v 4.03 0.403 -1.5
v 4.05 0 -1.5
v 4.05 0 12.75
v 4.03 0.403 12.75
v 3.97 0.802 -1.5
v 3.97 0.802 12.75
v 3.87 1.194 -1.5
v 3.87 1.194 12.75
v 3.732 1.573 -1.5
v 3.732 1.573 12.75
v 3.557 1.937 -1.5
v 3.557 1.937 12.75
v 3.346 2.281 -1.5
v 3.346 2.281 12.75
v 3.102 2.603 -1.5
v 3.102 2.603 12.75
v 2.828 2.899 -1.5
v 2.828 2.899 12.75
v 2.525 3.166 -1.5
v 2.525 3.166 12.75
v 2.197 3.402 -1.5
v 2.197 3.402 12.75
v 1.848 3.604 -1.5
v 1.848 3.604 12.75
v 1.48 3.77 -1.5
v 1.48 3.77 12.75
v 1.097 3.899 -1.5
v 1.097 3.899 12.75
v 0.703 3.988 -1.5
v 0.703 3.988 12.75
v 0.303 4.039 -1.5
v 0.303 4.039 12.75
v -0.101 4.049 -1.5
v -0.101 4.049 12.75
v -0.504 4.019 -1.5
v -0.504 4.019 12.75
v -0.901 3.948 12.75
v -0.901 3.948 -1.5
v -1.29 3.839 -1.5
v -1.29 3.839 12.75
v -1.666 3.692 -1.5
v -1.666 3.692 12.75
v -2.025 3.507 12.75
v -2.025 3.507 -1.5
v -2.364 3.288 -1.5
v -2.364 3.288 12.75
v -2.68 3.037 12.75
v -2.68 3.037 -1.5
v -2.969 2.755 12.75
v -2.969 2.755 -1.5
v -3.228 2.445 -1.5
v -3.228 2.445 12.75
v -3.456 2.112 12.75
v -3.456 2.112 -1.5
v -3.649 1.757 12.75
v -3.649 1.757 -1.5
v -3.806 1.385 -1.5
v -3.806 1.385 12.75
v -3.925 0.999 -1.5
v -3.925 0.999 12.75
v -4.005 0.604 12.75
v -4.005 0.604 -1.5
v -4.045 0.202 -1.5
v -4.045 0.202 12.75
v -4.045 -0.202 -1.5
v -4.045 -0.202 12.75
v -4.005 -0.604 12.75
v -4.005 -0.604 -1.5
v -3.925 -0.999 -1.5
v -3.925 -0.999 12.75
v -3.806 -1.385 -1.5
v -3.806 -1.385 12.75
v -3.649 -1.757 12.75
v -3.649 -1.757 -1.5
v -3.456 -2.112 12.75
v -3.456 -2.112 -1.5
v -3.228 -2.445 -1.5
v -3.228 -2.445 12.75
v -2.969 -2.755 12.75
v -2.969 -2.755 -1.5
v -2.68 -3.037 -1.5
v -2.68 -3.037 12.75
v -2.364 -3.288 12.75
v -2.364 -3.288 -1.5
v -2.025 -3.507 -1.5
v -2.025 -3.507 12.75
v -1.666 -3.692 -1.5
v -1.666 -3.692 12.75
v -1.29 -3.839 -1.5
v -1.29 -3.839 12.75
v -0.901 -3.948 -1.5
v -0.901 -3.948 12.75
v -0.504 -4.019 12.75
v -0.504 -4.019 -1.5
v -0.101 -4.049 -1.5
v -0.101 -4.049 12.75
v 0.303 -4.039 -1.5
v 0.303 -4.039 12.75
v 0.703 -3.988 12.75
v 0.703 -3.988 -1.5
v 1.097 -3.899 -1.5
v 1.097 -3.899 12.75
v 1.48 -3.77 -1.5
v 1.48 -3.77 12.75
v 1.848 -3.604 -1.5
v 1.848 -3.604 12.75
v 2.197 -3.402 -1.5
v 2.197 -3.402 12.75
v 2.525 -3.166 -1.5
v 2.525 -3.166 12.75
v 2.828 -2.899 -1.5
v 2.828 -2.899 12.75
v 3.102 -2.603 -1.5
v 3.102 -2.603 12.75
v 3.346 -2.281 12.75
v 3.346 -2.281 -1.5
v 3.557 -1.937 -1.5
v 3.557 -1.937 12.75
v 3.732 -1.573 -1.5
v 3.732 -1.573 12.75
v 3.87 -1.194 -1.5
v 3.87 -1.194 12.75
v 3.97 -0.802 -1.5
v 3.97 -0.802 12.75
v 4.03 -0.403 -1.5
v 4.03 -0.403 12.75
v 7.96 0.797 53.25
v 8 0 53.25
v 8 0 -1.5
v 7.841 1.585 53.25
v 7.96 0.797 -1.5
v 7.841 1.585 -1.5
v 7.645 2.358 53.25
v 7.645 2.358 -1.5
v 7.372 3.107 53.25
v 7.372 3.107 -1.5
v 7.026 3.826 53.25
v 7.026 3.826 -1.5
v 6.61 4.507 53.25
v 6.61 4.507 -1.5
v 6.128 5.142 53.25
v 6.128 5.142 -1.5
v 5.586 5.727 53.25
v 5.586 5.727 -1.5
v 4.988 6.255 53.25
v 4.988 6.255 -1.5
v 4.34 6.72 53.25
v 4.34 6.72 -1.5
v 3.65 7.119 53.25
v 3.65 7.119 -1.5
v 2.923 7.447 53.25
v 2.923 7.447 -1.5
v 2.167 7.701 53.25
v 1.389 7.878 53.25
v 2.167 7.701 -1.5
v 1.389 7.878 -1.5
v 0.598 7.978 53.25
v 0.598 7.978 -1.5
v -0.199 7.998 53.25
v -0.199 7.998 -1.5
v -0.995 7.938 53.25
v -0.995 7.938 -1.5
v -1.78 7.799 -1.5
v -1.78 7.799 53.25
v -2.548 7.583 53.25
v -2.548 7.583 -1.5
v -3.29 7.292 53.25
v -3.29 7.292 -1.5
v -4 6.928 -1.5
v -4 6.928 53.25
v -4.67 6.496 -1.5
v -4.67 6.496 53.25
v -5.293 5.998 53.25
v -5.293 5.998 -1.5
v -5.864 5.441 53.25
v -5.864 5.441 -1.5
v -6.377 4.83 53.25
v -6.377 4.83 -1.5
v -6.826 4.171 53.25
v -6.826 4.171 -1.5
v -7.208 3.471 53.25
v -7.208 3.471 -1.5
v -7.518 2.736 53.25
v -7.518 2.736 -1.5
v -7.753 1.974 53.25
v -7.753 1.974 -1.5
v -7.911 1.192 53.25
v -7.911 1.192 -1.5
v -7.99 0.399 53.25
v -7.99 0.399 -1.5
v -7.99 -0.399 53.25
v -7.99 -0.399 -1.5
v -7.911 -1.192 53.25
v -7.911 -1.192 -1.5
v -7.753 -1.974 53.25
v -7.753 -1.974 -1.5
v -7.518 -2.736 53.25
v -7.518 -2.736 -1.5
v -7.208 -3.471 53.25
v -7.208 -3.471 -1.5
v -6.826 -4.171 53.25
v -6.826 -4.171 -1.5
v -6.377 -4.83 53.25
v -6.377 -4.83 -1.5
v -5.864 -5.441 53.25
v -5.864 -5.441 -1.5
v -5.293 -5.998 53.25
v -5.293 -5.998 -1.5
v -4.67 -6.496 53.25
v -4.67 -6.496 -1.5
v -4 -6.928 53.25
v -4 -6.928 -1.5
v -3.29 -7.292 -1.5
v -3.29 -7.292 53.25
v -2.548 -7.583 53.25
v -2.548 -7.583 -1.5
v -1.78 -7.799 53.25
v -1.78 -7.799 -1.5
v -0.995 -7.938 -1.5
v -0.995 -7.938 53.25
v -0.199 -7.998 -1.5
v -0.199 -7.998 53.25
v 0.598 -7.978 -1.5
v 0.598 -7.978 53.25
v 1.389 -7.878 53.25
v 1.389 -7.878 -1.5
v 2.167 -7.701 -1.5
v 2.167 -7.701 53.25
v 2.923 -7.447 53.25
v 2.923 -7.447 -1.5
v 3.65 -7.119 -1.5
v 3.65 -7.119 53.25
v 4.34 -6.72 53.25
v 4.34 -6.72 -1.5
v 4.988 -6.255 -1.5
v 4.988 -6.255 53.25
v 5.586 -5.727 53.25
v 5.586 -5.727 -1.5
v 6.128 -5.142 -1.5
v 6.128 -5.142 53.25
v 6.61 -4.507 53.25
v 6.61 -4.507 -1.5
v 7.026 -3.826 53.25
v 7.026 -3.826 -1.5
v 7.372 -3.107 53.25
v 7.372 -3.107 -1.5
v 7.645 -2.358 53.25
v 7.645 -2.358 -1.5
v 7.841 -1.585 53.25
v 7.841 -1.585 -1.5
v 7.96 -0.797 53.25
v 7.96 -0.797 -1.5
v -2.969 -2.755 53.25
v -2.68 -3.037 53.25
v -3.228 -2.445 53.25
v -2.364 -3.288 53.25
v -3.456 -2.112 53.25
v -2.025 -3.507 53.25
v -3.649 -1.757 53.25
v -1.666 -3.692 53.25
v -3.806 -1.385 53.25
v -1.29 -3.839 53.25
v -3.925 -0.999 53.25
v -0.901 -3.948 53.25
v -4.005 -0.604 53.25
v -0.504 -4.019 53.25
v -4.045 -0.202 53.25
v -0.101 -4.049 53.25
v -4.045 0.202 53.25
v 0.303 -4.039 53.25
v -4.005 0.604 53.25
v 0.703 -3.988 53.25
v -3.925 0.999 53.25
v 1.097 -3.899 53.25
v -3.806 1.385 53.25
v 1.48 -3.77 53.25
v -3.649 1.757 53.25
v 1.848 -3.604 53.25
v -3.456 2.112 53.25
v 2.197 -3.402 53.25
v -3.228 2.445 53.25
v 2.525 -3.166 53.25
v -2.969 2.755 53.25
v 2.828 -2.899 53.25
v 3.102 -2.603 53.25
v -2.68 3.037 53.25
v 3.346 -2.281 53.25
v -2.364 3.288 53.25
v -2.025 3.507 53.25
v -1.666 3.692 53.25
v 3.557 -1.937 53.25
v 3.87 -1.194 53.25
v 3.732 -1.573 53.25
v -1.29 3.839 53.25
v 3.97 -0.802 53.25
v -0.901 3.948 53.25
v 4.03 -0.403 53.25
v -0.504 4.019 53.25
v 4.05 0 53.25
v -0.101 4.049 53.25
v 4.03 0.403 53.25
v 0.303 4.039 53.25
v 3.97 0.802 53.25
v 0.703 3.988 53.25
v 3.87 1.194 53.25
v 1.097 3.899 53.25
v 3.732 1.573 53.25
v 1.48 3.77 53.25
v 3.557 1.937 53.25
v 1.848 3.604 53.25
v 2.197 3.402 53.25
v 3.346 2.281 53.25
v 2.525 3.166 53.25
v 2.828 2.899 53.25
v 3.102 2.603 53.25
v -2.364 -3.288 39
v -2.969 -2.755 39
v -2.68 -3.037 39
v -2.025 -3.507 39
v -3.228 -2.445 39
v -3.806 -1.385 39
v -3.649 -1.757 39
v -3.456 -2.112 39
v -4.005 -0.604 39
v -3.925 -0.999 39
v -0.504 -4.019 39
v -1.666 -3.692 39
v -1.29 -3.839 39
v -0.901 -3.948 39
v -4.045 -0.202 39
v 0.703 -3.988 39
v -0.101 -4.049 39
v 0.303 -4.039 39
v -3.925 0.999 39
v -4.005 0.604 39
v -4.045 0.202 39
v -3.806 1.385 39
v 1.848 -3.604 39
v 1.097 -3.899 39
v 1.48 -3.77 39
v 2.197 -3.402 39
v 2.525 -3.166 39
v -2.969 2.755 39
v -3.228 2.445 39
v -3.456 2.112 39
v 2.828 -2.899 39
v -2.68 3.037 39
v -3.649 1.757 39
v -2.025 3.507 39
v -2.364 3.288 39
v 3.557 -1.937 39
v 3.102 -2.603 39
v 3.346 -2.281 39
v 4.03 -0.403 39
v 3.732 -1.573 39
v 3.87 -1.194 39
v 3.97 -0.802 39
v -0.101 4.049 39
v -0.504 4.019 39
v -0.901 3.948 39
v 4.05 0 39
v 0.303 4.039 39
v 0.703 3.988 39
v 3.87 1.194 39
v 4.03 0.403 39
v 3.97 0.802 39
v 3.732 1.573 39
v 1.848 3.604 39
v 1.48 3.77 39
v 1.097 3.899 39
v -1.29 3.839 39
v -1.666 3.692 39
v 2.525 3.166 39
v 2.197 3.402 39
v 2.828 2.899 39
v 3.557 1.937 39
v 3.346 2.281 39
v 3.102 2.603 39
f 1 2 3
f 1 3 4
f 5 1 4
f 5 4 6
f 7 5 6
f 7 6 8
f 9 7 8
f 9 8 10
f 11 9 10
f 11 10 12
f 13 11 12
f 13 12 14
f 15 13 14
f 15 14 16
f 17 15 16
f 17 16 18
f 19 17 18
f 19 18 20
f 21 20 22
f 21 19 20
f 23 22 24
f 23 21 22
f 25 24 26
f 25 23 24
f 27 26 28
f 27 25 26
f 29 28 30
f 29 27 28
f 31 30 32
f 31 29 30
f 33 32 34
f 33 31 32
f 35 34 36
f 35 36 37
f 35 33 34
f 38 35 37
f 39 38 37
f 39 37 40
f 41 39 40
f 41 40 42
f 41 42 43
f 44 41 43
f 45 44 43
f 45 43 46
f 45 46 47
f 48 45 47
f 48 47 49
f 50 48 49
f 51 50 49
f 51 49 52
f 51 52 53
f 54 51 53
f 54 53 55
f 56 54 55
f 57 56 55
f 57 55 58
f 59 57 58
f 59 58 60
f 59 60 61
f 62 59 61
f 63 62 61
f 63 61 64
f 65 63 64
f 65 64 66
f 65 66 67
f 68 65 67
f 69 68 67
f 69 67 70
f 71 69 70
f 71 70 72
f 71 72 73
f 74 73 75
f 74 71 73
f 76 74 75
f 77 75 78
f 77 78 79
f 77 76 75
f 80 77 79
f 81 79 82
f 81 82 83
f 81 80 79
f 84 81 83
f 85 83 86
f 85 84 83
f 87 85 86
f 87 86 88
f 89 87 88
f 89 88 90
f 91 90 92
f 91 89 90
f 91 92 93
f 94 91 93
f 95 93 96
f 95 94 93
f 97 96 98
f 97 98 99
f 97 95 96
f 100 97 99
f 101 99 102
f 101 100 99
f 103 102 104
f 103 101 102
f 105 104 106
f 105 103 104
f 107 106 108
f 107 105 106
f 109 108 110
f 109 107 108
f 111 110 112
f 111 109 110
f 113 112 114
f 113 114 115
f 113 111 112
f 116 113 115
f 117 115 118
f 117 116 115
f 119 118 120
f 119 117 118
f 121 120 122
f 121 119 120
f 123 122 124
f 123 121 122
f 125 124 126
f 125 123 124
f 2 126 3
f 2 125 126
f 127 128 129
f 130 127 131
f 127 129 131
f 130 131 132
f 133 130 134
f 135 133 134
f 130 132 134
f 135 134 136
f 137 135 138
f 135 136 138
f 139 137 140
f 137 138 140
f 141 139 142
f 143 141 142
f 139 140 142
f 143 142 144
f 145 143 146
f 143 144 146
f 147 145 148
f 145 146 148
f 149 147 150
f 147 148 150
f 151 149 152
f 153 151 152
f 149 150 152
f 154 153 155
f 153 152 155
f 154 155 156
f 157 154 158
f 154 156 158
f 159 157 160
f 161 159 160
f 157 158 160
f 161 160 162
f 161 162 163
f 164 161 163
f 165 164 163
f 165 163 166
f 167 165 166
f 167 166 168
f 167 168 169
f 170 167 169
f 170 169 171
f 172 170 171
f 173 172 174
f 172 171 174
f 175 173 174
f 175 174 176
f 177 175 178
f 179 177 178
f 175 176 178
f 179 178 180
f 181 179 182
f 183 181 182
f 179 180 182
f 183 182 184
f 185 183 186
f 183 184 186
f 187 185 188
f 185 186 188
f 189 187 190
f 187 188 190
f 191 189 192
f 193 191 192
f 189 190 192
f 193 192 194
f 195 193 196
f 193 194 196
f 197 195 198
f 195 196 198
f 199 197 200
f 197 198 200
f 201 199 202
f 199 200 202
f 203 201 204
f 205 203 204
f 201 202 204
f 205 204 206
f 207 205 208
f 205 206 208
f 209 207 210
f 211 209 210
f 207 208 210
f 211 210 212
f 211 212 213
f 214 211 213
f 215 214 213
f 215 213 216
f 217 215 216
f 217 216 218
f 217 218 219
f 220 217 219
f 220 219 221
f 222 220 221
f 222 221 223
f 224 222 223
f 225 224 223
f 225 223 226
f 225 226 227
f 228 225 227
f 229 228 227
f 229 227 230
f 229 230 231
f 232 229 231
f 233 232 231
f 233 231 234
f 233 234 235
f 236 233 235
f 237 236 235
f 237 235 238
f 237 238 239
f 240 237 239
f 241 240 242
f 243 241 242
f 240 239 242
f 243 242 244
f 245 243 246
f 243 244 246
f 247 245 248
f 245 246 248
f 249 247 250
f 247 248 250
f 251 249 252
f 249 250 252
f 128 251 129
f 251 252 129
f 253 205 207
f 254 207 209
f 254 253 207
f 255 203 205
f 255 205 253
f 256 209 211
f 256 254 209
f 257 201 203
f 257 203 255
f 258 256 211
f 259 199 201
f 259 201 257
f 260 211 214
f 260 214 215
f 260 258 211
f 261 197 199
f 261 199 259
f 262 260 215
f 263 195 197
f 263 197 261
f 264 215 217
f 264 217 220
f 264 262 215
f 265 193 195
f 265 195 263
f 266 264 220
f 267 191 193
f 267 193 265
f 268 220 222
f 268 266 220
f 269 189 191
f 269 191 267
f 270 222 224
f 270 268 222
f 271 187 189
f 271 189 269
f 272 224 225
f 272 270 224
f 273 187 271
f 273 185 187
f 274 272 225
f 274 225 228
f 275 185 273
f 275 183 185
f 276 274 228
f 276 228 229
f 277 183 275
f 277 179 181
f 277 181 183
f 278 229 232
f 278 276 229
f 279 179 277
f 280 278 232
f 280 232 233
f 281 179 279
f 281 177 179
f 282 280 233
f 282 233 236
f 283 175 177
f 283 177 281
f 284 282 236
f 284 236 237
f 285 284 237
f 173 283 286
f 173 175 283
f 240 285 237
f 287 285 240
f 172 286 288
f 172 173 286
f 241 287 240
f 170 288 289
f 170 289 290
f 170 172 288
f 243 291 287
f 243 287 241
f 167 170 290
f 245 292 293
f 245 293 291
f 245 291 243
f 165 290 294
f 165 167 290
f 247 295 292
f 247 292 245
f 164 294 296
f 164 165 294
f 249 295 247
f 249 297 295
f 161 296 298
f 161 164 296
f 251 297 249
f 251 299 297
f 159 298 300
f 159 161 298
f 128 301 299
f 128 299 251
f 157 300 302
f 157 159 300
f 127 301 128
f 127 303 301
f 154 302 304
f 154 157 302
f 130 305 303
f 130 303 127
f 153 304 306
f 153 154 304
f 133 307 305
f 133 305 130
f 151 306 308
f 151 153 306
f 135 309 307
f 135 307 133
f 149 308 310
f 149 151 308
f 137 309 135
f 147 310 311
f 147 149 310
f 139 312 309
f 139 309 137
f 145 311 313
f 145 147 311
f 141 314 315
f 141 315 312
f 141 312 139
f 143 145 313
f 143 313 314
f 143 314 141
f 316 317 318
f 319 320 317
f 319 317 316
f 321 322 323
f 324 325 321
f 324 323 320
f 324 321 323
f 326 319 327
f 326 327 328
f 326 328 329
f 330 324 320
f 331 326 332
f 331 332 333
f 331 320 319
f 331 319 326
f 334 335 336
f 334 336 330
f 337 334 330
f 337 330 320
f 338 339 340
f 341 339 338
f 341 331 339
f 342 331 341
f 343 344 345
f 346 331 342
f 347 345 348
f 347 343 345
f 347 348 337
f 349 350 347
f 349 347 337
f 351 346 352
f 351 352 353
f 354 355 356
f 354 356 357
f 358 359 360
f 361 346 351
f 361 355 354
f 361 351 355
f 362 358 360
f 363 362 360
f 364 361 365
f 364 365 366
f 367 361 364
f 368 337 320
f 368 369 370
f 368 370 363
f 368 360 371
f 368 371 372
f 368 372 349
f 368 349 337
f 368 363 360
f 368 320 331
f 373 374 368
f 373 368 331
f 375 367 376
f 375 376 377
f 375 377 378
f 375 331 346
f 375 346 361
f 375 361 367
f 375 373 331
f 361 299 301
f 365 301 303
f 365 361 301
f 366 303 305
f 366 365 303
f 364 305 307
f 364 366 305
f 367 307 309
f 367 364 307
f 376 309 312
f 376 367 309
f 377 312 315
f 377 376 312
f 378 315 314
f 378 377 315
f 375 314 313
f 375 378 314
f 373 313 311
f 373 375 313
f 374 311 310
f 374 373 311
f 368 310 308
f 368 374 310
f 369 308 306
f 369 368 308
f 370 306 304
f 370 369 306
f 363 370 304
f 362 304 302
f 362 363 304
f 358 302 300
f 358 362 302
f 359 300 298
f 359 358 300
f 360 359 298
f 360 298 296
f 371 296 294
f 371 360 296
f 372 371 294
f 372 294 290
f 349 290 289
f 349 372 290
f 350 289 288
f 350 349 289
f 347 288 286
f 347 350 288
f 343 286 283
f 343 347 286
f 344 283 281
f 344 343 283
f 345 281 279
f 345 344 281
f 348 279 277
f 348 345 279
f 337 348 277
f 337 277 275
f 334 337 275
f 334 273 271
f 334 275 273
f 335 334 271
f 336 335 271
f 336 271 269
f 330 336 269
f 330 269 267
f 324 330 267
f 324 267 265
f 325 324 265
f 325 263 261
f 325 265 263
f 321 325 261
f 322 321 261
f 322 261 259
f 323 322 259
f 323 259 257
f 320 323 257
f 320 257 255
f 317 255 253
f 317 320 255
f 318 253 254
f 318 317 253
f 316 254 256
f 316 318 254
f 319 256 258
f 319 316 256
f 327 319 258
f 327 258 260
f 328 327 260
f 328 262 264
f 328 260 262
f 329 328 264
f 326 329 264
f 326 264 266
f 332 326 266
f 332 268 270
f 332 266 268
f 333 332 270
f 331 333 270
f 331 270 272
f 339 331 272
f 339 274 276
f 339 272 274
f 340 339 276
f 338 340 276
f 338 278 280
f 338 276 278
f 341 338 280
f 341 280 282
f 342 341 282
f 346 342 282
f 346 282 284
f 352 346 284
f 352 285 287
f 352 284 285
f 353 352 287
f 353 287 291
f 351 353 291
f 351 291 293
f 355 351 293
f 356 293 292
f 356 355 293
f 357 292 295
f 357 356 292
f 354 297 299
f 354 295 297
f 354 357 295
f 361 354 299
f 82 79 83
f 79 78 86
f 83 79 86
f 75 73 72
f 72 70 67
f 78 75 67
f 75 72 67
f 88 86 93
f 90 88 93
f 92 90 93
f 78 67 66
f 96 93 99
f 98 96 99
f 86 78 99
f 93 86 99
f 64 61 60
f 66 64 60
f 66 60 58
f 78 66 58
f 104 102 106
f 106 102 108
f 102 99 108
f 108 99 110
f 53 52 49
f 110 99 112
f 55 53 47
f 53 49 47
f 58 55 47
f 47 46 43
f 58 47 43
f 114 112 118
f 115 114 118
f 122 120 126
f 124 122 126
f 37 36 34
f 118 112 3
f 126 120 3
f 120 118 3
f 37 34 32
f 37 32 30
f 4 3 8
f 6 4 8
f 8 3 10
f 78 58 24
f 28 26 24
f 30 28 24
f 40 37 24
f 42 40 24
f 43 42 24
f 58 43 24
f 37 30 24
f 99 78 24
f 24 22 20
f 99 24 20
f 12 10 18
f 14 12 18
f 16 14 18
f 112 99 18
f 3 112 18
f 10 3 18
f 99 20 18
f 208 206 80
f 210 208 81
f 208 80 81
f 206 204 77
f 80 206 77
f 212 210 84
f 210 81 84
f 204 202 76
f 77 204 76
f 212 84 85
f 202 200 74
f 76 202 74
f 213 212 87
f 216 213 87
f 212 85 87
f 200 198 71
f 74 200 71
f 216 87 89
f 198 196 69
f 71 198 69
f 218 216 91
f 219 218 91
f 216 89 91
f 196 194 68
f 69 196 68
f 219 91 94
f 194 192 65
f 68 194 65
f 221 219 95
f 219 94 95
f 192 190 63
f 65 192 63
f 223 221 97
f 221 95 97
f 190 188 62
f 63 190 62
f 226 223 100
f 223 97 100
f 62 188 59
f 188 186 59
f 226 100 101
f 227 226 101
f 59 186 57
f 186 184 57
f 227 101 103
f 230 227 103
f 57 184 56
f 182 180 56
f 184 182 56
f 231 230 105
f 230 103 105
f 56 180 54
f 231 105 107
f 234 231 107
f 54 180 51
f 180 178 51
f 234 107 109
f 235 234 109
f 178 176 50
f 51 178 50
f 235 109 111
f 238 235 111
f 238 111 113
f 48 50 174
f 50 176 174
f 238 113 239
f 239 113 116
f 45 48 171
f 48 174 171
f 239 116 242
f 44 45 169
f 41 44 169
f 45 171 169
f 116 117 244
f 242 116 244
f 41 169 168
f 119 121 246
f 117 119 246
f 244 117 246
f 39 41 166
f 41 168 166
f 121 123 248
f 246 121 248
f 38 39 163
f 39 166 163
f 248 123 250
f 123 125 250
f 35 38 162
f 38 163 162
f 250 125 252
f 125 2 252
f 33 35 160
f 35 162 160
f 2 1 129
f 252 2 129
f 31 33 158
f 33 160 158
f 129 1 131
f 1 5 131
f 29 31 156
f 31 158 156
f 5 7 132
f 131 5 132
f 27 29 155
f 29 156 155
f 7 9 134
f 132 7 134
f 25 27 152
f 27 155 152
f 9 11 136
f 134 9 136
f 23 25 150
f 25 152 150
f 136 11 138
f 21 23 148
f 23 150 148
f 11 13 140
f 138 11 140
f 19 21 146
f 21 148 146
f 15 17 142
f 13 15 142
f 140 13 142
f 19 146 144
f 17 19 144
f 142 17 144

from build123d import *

# Parameters (mm, degrees)
F_01_START                               = -1.5
S01_SOLID_POST_BLANK_16_MM_R             = 8
F_01_SOLID_POST_BLANK_16_MM_DEPTH        = 54.75
F_02_START                               = -1.6
S02_REAR_M6_HEAT_SET_INSERT_SEAT_R       = 4.05
F_02_REAR_M6_HEAT_SET_INSERT_SEAT_DEPTH  = 14.35
F_03_START                               = 39
S03_FRONT_M6_HEAT_SET_INSERT_SEAT_R      = 4.05
F_03_FRONT_M6_HEAT_SET_INSERT_SEAT_DEPTH = 14.35


with BuildPart() as part:
    # S01 - Solid post blank - 16 mm → 01 - Solid post blank - 16 mm (new body)
    with BuildSketch(Plane.XY.offset(F_01_START)):
        Circle(S01_SOLID_POST_BLANK_16_MM_R)
    extrude(amount=F_01_SOLID_POST_BLANK_16_MM_DEPTH)

    # S02 - Rear M6 heat-set insert seat → 02 - Rear M6 heat-set insert seat (cut)
    with BuildSketch(Plane.XY.offset(F_02_START)):
        Circle(S02_REAR_M6_HEAT_SET_INSERT_SEAT_R)
    extrude(amount=F_02_REAR_M6_HEAT_SET_INSERT_SEAT_DEPTH, mode=Mode.SUBTRACT)

    # S03 - Front M6 heat-set insert seat → 03 - Front M6 heat-set insert seat (cut)
    with BuildSketch(Plane.XY.offset(F_03_START)):
        Circle(S03_FRONT_M6_HEAT_SET_INSERT_SEAT_R)
    extrude(amount=F_03_FRONT_M6_HEAT_SET_INSERT_SEAT_DEPTH, mode=Mode.SUBTRACT)


solid = part.part
